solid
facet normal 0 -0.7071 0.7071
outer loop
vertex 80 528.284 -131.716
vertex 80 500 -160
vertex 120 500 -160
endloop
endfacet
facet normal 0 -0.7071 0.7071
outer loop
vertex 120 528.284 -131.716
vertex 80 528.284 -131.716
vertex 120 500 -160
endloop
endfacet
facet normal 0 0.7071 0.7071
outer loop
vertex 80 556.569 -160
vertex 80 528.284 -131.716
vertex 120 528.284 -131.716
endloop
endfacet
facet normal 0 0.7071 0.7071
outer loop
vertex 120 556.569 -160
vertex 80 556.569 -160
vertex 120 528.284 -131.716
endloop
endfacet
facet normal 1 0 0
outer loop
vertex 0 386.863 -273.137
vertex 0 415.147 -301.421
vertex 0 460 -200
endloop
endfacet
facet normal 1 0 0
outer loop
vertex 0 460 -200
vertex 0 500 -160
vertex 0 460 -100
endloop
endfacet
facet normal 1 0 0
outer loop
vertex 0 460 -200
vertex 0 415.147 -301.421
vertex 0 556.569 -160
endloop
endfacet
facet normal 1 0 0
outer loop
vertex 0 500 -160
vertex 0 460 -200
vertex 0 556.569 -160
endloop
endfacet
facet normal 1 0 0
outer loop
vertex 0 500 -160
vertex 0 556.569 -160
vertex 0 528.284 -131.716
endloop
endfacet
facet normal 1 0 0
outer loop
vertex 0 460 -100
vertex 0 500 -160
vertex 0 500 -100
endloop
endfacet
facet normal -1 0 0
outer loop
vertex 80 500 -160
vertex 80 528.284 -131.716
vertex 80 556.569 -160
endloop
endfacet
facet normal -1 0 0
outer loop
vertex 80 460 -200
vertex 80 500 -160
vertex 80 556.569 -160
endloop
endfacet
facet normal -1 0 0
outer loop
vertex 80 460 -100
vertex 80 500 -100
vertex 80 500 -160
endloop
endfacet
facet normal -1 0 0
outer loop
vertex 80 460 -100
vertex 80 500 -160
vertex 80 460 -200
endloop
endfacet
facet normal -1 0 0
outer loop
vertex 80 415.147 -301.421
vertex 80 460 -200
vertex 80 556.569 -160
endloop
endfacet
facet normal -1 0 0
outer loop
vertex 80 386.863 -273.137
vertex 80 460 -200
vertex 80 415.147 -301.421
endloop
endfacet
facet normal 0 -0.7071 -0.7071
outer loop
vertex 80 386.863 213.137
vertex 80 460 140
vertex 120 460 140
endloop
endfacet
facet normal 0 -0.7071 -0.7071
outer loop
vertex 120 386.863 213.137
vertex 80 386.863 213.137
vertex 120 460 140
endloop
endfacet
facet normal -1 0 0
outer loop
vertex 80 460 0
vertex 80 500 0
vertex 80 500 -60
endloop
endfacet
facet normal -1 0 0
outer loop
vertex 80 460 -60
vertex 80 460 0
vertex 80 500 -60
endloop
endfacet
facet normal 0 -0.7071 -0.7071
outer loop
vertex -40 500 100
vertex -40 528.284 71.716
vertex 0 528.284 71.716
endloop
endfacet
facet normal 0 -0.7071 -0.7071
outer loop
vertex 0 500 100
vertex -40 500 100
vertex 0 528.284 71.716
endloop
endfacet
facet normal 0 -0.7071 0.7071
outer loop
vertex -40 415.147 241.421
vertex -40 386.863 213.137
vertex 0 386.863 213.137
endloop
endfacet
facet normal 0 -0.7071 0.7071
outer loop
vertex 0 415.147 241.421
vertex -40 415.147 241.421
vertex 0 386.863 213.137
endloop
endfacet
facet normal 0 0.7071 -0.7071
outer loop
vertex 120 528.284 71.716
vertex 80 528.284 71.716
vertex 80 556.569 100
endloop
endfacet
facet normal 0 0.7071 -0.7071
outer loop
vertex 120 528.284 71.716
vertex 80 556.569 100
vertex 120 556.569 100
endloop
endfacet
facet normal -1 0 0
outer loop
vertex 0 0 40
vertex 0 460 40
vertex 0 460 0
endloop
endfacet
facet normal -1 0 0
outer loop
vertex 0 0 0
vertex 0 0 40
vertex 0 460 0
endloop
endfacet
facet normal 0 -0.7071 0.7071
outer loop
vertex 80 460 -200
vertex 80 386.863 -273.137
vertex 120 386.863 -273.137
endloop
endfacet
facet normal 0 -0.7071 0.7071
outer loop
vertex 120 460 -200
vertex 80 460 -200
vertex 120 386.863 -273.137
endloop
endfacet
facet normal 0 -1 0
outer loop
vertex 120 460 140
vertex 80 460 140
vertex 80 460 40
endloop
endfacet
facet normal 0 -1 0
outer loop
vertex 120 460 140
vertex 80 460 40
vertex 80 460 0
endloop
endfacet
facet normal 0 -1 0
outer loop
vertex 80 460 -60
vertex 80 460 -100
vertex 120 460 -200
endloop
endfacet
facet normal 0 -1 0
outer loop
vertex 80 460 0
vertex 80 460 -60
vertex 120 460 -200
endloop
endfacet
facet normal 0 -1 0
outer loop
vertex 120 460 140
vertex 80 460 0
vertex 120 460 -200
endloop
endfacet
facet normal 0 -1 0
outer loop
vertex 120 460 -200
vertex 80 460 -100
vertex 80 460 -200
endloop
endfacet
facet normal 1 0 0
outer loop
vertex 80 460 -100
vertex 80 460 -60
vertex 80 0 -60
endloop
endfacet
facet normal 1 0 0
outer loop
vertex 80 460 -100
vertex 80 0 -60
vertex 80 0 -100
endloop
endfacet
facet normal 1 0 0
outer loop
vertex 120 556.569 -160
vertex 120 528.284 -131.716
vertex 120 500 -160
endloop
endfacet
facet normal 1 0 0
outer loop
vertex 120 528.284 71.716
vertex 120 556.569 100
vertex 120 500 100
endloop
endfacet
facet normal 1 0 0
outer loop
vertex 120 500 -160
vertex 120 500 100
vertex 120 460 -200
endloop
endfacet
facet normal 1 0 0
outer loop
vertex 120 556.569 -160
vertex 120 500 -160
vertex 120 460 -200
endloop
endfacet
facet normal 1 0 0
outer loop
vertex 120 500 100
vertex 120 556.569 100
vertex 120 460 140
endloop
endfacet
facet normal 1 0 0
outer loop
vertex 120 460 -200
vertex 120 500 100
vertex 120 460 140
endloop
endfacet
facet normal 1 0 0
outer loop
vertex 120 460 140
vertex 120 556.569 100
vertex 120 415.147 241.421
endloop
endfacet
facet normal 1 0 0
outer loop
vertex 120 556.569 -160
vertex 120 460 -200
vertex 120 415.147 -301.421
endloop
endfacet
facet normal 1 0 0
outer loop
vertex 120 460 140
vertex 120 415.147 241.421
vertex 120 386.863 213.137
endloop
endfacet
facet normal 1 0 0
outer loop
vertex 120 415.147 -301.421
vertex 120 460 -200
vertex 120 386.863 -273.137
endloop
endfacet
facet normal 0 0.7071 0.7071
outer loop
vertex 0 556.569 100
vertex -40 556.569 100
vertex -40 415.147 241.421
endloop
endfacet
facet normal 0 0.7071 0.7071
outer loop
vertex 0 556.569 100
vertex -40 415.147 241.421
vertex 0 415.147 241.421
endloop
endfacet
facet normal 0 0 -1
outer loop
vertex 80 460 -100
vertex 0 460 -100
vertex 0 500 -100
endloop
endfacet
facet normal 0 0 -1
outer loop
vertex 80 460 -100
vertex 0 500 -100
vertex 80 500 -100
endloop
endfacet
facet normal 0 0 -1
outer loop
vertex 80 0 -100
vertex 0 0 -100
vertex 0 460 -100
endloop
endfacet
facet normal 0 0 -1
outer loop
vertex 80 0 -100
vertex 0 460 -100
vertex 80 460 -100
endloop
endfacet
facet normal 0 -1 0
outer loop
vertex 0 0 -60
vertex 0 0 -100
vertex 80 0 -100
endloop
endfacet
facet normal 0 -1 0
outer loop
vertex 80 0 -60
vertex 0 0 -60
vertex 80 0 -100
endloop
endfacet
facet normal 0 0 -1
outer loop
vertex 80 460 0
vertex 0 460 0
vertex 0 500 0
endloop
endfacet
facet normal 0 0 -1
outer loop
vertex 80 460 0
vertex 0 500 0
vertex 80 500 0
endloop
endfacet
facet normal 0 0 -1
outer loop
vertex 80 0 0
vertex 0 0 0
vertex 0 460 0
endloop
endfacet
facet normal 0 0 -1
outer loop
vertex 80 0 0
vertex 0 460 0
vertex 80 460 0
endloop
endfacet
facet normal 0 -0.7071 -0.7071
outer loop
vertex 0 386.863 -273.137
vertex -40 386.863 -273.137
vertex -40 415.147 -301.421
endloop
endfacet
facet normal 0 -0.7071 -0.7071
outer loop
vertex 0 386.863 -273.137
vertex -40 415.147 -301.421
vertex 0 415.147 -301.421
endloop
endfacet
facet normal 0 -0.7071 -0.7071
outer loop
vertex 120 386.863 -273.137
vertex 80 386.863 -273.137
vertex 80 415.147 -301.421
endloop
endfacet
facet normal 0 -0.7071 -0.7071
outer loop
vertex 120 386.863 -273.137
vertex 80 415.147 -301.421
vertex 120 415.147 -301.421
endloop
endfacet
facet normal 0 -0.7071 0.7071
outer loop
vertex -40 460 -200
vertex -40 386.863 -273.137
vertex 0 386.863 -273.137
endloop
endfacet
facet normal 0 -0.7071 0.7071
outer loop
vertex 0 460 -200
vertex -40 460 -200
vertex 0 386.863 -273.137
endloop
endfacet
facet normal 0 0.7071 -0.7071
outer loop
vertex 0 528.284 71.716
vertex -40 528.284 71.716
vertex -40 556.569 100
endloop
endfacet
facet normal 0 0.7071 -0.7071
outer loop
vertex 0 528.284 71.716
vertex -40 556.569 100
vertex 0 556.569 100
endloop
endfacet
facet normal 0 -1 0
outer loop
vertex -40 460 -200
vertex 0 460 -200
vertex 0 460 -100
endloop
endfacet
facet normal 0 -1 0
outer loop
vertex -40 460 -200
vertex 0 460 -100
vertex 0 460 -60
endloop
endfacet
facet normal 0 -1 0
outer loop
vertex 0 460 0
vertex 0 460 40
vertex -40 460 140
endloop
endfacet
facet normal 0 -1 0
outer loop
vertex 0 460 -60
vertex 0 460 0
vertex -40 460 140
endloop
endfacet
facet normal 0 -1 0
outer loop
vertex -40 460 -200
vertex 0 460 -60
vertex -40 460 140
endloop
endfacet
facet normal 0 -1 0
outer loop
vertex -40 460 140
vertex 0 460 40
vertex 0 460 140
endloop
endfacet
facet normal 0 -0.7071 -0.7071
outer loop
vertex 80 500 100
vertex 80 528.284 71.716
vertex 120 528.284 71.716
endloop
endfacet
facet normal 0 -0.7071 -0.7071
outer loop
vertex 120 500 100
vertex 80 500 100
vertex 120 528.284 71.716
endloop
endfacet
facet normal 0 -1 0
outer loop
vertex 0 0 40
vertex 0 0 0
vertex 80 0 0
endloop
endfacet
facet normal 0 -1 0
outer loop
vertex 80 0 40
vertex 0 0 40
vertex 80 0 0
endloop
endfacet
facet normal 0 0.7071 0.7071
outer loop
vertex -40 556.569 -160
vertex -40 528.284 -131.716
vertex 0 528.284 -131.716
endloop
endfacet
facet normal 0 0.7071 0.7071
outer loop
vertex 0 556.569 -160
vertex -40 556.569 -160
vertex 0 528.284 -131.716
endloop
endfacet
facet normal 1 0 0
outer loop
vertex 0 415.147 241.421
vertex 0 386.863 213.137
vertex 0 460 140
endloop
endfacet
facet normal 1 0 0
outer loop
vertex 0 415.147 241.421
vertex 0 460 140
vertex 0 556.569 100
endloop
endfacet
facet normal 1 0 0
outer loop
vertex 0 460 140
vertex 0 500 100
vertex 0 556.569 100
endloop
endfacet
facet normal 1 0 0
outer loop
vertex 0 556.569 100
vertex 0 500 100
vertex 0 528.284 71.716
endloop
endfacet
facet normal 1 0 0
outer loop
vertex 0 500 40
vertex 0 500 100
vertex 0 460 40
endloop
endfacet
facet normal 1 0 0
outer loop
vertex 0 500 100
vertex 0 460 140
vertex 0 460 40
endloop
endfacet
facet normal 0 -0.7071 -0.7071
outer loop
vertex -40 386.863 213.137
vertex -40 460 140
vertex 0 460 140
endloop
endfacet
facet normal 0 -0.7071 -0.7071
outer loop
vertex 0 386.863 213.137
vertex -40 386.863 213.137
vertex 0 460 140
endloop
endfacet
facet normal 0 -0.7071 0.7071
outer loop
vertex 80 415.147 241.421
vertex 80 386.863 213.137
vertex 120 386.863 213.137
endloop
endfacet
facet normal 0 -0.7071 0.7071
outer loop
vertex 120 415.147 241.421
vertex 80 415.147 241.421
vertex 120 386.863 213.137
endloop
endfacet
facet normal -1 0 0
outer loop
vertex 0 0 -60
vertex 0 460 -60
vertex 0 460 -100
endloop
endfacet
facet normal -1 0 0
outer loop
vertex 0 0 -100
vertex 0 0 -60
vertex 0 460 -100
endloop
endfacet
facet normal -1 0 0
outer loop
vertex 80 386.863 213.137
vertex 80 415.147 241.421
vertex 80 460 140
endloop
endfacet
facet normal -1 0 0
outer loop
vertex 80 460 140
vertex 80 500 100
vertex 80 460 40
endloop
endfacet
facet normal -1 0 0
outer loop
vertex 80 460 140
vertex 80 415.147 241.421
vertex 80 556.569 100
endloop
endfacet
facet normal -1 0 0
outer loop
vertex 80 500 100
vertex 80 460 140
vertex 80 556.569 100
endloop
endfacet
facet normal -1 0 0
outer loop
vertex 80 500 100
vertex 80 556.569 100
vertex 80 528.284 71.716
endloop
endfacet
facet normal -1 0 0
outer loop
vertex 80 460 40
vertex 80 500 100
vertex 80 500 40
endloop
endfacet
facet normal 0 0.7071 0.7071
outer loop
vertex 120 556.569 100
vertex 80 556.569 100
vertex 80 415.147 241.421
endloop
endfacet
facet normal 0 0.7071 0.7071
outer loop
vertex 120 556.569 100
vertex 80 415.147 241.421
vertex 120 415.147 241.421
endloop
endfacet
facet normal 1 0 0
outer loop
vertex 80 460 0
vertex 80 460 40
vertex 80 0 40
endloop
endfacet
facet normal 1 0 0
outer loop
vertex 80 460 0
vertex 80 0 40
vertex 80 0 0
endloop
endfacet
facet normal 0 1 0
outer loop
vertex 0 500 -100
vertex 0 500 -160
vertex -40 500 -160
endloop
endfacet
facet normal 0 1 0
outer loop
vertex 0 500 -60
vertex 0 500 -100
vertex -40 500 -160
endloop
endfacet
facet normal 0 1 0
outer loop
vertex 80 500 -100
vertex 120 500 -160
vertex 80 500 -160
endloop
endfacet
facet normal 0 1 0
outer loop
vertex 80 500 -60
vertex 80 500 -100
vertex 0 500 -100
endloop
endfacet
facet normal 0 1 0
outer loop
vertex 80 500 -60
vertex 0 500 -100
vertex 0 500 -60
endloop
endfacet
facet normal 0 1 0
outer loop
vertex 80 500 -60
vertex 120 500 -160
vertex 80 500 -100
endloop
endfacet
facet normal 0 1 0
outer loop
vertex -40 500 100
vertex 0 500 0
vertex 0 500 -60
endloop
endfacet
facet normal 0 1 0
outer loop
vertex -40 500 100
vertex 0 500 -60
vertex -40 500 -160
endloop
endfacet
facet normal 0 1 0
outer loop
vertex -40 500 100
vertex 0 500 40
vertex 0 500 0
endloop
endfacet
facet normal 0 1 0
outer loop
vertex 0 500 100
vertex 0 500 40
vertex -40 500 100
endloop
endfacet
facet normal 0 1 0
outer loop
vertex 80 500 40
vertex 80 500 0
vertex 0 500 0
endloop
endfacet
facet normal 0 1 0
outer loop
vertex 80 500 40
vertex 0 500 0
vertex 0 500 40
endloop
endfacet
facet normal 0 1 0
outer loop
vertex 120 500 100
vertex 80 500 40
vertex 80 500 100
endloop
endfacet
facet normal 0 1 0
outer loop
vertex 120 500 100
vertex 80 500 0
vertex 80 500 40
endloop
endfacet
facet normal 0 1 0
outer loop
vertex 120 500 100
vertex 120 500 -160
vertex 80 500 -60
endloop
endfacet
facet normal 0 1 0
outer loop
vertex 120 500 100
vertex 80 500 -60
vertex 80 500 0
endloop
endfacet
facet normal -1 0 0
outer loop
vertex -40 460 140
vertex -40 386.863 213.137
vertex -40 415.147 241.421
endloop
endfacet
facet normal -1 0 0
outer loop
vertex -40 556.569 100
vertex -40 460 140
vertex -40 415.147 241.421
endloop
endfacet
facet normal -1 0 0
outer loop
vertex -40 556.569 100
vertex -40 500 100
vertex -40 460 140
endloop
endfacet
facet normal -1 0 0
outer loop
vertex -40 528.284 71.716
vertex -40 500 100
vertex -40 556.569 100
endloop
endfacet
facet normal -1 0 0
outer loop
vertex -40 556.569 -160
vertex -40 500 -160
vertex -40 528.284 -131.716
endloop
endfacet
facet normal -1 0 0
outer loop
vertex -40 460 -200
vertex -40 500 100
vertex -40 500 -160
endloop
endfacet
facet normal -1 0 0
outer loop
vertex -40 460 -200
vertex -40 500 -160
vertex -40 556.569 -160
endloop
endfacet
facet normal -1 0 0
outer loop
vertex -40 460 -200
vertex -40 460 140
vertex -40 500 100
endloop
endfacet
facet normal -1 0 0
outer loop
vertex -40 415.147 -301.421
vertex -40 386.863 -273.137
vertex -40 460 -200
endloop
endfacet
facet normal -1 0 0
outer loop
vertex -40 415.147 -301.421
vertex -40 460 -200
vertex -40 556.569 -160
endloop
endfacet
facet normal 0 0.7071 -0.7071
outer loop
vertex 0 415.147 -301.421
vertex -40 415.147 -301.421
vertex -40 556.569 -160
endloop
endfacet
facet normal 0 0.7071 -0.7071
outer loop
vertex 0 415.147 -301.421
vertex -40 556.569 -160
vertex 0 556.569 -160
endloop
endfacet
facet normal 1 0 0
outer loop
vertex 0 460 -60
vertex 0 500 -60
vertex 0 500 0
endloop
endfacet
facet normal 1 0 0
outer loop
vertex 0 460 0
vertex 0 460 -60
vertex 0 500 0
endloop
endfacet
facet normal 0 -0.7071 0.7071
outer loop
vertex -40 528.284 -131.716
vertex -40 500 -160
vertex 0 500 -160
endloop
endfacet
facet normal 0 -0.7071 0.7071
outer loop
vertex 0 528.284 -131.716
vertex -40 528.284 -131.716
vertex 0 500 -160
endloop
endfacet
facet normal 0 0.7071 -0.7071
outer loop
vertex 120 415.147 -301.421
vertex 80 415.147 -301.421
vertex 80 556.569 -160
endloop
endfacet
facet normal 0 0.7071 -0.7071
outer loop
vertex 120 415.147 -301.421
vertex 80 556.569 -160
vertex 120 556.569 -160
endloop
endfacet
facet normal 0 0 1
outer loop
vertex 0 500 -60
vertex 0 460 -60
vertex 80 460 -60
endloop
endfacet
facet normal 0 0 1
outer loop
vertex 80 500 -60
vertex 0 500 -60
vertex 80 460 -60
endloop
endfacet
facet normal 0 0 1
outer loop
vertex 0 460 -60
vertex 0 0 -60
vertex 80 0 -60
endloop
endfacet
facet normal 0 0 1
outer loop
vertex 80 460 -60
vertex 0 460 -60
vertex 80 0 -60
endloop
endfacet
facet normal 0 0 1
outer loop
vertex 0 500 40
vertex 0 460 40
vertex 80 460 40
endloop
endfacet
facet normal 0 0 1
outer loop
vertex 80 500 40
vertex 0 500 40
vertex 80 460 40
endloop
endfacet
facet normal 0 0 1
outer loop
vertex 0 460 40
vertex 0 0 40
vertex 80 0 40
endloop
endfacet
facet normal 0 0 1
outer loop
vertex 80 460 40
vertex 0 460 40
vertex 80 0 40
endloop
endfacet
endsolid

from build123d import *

# Parameters (mm, degrees)
SKETCH_1_W               = 80
SKETCH_1_H               = 40
EXTRUDE_1_DEPTH          = 500
EXTRUDE_1_2_DEPTH        = 500
SKETCH_2_W               = 340
SKETCH_2_H               = 40
EXTRUDE_2_DEPTH          = 40
SKETCH_3_W               = 340
SKETCH_3_H               = 40
EXTRUDE_3_DEPTH          = 40
CUT_EXTRUDE_1_DEPTH      = 1
CUT_EXTRUDE_1_DEPTH_BACK = 161
SKETCH_5_W               = 40
SKETCH_5_H               = 200
EXTRUDE_4_DEPTH          = 40
SKETCH_6_W               = 40
SKETCH_6_H               = 200
EXTRUDE_5_DEPTH          = 40


with BuildPart() as part:
    # 草图1 → 凸台-拉伸1 (new body)
    with BuildSketch(Plane(origin=(0, 0, 0), x_dir=(1, 0, 0), z_dir=(0, 1, 0))):
        with Locations((40, -20)):
            Rectangle(SKETCH_1_W, SKETCH_1_H)
    extrude(amount=EXTRUDE_1_DEPTH)



with BuildPart() as body_2:
    # 草图1 → Extrude 1 2 (new body)
    with BuildSketch(Plane(origin=(0, 0, 0), x_dir=(1, 0, 0), z_dir=(0, 1, 0))):
        with Locations((40, 80)):
            Rectangle(SKETCH_1_W, SKETCH_1_H)
    extrude(amount=EXTRUDE_1_2_DEPTH)


with BuildPart() as part_1:
    add(part.part)

    add(body_2.part)  # 凸台-拉伸2 merges body 2
    # 草图2 → 凸台-拉伸2 (add)
    with BuildSketch(Plane(origin=(80, 0, 0), x_dir=(0, 0, -1), z_dir=(1, 0, 0))):
        with Locations((30, 480)):
            Rectangle(SKETCH_2_W, SKETCH_2_H)
    extrude(amount=EXTRUDE_2_DEPTH)

    # 草图3 → 凸台-拉伸3 (add)
    with BuildSketch(Plane.ZY):
        with Locations((-30, 480)):
            Rectangle(SKETCH_3_W, SKETCH_3_H)
    extrude(amount=EXTRUDE_3_DEPTH)

    # 草图4 → 切除-拉伸1 (cut, two sides)
    with BuildSketch(Plane.ZY.offset(40)) as cut_extrude_1_sk:
        Polygon((140, 460), (100, 500), (140, 500), align=None)
        Polygon((-200, 460), (-160, 500), (-200, 500), align=None)
    extrude(amount=CUT_EXTRUDE_1_DEPTH, mode=Mode.SUBTRACT)
    extrude(cut_extrude_1_sk.sketch, amount=-CUT_EXTRUDE_1_DEPTH_BACK, mode=Mode.SUBTRACT)

    # 草图5 → 凸台-拉伸4 (add)
    with BuildSketch(Plane(origin=(0, 300, 300), x_dir=(1, 0, 0), z_dir=(0, 0.707106781, 0.707106781))):
        with Locations((-20, 222.842712475)):
            Rectangle(SKETCH_5_W, SKETCH_5_H)
        with Locations((100, 222.842712475)):
            Rectangle(SKETCH_5_W, SKETCH_5_H)
    extrude(amount=EXTRUDE_4_DEPTH)

    # 草图6 → 凸台-拉伸5 (add)
    with BuildSketch(Plane(origin=(0, 330, -330), x_dir=(1, 0, 0), z_dir=(0, 0.707106781, -0.707106781))):
        with Locations((100, -180.416305603)):
            Rectangle(SKETCH_6_W, SKETCH_6_H)
        with Locations((-20, -180.416305603)):
            Rectangle(SKETCH_6_W, SKETCH_6_H)
    extrude(amount=EXTRUDE_5_DEPTH)


solid = part_1.part
